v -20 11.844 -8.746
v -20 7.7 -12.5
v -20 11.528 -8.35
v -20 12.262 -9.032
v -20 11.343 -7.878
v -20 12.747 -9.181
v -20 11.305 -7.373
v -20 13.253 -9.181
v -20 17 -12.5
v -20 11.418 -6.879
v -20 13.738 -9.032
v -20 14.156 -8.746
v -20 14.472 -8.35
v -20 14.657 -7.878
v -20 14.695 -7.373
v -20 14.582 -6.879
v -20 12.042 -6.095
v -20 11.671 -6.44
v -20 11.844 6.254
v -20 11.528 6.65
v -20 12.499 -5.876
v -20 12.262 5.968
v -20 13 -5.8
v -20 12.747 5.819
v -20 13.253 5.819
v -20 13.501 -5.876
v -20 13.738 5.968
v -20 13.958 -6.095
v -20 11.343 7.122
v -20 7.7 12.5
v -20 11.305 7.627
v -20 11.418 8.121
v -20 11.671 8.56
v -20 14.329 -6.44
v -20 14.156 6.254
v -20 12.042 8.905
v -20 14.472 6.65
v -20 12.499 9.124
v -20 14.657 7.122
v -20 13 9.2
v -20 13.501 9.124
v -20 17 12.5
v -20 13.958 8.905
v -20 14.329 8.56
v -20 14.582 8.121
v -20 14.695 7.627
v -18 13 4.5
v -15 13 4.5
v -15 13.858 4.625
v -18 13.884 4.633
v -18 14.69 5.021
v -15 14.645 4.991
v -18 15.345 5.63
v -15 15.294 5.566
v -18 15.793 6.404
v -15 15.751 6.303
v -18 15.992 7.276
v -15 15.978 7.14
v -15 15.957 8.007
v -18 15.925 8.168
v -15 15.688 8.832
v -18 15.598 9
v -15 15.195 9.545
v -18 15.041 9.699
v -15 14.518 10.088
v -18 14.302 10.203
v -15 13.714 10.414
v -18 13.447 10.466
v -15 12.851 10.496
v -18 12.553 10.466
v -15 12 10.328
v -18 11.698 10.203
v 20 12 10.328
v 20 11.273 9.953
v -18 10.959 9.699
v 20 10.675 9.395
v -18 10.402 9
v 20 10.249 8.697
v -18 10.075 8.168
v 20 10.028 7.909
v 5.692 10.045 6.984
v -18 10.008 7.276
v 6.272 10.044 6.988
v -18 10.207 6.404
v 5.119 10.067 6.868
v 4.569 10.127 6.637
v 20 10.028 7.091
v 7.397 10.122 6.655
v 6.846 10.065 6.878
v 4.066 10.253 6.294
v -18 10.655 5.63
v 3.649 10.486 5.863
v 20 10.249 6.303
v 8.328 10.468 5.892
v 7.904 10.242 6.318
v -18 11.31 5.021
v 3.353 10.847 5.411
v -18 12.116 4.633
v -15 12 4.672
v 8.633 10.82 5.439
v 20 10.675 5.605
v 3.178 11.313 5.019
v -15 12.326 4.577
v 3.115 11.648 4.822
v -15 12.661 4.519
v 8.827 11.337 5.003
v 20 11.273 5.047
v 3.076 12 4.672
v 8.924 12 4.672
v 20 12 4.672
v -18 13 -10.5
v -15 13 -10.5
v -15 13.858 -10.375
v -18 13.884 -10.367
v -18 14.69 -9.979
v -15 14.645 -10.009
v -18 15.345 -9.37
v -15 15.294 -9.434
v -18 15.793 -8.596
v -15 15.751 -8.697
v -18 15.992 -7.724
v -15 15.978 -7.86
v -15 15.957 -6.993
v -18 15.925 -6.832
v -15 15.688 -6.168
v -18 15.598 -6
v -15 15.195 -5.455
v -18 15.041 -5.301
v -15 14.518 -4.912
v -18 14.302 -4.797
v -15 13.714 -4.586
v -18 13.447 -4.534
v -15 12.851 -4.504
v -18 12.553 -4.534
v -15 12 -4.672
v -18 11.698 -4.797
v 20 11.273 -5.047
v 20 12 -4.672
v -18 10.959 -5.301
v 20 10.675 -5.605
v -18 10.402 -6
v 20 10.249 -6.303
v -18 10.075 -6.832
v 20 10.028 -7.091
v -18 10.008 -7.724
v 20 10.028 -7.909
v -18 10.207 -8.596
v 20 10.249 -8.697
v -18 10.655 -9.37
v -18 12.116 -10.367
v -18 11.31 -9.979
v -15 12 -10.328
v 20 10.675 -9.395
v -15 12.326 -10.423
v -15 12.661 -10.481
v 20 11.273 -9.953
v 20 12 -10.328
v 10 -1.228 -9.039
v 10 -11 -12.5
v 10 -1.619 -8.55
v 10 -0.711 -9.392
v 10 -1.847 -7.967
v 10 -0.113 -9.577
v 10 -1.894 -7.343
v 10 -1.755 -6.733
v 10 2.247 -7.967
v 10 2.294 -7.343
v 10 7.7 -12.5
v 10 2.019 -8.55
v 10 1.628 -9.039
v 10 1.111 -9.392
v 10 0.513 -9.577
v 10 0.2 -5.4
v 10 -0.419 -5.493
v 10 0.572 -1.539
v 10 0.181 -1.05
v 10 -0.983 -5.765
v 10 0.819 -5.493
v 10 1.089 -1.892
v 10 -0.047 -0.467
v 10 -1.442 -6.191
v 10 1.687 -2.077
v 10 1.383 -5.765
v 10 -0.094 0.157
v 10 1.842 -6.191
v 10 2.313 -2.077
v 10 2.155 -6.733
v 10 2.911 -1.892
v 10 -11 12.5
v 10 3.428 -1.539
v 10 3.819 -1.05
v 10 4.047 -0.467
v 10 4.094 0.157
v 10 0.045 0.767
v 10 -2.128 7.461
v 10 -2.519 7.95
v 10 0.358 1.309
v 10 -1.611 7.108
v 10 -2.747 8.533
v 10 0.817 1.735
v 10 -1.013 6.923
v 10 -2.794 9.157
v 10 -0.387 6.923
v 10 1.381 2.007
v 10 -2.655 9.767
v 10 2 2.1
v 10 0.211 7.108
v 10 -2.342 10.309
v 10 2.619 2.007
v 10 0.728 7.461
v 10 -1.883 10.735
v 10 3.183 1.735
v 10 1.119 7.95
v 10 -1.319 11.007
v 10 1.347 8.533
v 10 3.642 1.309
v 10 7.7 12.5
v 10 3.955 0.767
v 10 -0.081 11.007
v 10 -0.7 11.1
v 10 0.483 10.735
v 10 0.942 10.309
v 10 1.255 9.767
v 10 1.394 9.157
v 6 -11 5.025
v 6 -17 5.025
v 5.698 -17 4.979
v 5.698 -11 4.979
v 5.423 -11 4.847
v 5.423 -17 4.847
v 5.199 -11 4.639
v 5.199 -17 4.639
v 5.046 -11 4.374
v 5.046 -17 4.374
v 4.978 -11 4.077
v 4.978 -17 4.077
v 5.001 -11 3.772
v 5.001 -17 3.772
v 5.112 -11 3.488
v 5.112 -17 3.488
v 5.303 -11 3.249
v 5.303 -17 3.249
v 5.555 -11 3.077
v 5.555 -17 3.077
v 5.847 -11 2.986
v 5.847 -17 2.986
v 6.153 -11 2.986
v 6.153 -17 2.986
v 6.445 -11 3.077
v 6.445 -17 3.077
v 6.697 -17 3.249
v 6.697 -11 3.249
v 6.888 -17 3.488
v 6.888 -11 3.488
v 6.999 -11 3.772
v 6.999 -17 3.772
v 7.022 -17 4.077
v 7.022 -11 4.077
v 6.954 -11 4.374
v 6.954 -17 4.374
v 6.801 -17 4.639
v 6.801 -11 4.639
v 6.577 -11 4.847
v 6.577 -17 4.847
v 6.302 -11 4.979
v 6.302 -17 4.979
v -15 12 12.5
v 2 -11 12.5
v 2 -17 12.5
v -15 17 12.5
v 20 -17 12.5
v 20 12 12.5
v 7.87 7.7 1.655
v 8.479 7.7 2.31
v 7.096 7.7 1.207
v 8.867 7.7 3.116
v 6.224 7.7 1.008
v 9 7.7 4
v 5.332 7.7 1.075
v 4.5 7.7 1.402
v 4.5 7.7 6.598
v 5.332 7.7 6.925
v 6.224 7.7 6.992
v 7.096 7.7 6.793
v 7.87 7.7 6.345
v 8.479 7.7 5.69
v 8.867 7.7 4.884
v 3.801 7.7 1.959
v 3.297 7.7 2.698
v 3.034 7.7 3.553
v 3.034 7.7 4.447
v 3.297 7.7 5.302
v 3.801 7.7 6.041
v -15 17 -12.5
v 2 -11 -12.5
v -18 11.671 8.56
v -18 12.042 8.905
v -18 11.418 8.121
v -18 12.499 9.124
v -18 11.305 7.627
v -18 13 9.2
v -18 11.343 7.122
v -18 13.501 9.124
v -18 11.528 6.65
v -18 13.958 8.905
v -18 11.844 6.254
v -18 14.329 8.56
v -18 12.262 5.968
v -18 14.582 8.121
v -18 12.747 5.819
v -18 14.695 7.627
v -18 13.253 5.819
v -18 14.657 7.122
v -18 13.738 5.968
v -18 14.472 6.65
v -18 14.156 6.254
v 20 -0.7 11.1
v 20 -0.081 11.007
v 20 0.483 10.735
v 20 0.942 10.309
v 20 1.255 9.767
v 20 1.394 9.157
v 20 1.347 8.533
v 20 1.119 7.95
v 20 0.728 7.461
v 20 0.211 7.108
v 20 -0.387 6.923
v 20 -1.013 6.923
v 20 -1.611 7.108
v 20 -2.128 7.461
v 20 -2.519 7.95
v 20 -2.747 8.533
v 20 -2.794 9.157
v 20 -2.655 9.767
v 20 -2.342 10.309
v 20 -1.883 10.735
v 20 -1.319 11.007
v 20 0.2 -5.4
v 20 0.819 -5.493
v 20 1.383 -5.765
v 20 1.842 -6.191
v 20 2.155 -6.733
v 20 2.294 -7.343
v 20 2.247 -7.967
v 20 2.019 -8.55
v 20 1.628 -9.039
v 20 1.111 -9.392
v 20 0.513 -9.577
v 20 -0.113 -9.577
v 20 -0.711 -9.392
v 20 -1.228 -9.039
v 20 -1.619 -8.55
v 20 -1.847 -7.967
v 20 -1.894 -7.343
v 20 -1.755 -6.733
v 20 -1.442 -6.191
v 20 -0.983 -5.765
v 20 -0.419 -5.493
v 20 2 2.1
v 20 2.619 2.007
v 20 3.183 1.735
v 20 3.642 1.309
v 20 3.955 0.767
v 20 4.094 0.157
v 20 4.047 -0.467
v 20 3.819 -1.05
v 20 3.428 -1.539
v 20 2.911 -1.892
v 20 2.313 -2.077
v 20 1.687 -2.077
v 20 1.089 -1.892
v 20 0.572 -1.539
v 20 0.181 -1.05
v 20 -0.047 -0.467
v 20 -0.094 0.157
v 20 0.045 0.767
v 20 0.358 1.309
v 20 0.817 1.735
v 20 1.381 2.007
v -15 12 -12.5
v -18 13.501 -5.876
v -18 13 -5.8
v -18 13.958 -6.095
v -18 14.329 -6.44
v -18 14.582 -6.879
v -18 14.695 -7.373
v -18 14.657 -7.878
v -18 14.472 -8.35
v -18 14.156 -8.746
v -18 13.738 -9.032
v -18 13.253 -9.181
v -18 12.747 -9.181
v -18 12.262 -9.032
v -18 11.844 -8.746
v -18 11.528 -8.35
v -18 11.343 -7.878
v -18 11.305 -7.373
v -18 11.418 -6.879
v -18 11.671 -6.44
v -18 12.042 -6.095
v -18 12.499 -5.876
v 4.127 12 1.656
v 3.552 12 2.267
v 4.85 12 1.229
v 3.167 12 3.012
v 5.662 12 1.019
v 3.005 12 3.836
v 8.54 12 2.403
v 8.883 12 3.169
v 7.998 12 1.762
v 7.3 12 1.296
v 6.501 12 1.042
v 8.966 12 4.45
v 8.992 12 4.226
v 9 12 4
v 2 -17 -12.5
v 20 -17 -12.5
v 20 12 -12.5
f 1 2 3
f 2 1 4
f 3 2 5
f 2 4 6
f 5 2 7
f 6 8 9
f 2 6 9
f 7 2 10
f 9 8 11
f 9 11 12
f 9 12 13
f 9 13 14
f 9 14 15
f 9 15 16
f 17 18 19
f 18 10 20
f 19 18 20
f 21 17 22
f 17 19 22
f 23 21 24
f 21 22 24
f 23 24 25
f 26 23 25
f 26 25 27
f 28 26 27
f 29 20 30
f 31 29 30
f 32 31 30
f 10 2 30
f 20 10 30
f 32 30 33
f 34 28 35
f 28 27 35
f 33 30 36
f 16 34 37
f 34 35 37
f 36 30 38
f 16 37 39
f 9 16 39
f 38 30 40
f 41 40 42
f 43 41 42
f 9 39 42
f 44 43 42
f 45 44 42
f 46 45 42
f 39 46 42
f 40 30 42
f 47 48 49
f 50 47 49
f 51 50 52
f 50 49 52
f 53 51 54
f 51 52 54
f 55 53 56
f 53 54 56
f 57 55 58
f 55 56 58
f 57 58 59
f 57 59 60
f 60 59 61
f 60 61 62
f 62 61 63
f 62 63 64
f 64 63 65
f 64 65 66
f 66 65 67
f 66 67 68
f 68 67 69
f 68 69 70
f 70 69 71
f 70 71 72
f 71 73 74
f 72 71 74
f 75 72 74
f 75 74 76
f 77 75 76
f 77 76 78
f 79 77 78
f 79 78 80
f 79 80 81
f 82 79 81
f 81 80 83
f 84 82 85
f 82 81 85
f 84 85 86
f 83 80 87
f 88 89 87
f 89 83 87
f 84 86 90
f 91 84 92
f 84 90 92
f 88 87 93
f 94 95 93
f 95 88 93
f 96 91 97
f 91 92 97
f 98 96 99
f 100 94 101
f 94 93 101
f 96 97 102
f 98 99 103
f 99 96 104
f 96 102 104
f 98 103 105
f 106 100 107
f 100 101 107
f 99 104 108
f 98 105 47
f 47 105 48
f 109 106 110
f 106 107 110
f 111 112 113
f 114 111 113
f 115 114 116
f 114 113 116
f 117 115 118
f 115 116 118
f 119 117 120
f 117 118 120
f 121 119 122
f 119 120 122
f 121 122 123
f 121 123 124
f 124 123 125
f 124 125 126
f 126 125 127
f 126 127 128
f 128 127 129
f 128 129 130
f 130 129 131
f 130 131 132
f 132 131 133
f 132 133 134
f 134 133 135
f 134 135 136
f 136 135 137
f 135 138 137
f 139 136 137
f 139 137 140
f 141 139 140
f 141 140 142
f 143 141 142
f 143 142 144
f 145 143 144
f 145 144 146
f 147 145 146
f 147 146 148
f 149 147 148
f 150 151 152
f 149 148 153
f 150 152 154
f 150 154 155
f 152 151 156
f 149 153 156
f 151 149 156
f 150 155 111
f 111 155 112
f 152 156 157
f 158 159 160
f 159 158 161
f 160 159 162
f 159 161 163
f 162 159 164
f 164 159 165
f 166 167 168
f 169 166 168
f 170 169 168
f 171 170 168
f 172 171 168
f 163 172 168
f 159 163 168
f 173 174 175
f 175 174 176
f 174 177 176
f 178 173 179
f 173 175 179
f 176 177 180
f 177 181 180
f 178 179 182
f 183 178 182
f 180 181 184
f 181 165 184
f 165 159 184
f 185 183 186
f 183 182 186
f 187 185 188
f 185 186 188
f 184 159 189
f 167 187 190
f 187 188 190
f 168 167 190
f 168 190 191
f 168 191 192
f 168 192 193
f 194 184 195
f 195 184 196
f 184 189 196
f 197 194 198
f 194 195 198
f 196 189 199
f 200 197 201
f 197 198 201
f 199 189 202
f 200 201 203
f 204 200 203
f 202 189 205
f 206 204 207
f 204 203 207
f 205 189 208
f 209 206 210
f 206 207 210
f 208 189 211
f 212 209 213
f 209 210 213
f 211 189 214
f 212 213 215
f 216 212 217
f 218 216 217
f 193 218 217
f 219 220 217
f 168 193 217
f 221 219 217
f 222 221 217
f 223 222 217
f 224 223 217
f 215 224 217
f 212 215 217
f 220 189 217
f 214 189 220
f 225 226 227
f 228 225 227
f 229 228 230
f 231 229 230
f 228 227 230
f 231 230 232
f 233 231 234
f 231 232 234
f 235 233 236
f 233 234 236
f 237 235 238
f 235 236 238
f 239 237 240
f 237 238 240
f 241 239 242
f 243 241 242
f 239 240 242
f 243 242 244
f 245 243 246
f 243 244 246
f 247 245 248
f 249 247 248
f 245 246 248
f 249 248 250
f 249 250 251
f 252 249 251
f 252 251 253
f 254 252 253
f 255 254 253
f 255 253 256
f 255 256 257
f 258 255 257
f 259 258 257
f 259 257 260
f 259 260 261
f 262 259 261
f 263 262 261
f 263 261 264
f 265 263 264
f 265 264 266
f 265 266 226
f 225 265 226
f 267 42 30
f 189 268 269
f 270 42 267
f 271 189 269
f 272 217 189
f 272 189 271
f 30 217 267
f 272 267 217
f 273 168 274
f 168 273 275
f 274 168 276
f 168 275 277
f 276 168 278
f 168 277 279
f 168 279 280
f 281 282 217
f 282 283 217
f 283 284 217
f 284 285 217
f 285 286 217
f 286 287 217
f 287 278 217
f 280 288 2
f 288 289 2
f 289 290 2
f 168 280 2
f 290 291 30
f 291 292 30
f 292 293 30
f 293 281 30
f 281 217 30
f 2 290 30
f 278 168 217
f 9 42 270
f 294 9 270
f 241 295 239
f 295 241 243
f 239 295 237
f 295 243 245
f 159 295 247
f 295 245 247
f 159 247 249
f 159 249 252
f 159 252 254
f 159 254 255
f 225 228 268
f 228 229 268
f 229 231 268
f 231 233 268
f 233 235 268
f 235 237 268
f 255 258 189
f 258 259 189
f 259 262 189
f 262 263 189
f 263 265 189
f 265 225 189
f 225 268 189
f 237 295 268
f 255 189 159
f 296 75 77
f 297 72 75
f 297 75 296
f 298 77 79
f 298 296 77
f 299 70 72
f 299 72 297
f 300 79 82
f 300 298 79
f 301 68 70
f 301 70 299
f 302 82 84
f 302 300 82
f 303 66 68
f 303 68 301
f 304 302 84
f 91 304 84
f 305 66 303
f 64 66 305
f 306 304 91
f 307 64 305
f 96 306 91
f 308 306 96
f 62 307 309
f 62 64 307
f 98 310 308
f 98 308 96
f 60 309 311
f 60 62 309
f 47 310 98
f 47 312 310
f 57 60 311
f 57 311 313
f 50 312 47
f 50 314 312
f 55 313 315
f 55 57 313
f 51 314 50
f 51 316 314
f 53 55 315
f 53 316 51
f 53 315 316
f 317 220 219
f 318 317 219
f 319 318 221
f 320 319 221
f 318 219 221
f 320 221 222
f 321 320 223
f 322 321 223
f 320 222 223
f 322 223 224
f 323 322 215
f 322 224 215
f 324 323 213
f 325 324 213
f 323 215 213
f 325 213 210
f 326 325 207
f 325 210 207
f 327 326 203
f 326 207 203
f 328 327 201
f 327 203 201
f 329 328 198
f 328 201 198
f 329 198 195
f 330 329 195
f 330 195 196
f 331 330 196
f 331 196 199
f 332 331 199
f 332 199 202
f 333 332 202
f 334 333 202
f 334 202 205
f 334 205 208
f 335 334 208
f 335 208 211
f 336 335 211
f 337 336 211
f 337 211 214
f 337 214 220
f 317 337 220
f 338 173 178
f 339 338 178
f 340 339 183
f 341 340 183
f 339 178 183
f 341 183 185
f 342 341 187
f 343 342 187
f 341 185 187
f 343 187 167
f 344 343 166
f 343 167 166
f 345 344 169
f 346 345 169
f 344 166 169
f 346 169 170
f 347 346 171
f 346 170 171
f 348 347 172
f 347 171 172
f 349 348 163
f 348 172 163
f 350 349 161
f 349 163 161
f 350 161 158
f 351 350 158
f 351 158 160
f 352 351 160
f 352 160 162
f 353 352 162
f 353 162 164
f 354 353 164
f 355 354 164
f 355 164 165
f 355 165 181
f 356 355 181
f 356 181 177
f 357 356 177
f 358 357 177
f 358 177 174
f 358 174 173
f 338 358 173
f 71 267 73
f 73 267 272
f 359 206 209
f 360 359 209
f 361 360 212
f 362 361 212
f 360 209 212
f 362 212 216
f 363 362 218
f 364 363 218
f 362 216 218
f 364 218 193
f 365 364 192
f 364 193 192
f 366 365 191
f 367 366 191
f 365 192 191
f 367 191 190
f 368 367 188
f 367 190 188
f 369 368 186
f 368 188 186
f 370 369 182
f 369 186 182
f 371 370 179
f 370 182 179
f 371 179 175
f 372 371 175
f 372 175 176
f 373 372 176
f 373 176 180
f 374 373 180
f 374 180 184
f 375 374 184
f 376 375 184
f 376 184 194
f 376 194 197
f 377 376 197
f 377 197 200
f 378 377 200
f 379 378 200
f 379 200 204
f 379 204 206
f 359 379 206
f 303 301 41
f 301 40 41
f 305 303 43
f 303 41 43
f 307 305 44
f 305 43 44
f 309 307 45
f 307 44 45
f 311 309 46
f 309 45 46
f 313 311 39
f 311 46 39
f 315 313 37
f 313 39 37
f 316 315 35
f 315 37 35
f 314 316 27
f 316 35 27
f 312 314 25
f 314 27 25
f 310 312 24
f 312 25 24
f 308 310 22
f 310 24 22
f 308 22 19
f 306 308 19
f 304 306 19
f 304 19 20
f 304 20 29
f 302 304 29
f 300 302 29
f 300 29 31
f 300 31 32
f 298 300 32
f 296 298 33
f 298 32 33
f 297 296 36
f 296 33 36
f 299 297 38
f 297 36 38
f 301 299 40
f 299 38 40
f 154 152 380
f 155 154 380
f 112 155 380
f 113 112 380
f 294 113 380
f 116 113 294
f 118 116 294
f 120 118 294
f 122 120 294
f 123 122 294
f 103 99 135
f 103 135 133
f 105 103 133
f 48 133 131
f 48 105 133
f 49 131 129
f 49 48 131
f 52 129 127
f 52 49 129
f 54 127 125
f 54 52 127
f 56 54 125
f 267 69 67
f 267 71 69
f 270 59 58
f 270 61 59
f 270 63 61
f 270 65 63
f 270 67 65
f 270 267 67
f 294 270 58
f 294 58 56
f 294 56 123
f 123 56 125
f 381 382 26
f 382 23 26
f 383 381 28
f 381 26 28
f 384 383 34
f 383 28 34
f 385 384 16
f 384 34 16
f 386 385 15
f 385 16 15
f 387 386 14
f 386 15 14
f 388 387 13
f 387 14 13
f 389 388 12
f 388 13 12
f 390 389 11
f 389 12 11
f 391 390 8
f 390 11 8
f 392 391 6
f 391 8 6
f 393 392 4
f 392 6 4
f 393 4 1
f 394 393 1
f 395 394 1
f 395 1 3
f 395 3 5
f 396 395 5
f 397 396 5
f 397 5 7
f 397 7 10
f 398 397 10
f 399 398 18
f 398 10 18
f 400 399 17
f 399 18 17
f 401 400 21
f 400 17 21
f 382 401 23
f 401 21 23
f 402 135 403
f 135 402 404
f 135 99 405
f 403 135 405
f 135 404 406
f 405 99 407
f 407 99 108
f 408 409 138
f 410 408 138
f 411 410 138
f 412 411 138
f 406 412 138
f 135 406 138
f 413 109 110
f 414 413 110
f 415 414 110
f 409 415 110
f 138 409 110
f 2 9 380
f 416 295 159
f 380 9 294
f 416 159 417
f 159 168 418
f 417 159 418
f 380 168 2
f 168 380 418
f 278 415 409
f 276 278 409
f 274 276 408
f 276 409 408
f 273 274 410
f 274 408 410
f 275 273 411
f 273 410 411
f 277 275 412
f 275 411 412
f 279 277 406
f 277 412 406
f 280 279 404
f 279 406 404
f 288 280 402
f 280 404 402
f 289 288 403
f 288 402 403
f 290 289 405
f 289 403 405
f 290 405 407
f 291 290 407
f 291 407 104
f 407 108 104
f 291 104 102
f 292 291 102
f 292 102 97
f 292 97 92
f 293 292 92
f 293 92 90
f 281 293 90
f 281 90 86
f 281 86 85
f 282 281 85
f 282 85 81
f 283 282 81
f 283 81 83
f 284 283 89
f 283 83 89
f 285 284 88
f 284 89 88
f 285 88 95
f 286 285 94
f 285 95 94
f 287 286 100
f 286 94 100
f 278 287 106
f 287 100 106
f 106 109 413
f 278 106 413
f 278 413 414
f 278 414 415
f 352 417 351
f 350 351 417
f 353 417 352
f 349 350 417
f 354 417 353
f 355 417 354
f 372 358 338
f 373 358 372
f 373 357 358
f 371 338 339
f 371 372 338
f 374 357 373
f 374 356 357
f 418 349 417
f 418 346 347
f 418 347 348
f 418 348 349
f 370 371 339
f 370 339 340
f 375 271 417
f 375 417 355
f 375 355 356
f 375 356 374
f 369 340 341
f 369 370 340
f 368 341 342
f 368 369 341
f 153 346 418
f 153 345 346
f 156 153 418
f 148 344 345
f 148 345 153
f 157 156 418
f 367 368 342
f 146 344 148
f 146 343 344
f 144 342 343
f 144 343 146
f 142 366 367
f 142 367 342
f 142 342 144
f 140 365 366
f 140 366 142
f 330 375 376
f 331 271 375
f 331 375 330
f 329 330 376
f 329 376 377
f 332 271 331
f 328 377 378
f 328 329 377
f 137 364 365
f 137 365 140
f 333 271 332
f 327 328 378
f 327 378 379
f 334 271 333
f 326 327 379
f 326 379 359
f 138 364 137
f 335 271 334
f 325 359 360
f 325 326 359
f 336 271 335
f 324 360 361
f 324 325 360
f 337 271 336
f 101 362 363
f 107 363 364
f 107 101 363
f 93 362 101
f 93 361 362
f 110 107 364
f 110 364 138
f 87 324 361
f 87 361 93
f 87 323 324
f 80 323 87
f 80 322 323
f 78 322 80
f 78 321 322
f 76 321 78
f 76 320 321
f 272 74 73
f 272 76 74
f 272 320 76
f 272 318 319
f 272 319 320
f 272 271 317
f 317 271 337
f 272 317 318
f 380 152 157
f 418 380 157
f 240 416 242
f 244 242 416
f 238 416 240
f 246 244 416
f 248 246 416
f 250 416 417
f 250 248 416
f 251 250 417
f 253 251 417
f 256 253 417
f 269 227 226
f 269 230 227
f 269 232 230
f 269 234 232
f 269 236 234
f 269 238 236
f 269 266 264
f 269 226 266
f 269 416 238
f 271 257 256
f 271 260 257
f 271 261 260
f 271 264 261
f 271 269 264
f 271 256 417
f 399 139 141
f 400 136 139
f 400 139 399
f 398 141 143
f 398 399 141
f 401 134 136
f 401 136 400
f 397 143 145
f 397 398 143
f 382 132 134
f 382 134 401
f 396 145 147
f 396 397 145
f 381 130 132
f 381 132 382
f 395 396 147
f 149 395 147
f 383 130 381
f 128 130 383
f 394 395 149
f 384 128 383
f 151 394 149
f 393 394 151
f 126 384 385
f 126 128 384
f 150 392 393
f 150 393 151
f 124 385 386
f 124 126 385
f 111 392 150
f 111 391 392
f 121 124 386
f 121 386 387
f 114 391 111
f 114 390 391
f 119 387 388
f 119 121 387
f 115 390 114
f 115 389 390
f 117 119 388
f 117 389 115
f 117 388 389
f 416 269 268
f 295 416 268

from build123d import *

# Parameters (mm, degrees)
SKETCH_1_W                = 40
SKETCH_1_H                = 34
EXTRUDE_1_DEPTH           = 12.5
HOLE_WIZARD_1_D           = 3.4
HOLE_WIZARD_1_CBORE_D     = 6
HOLE_WIZARD_1_CBORE_DEPTH = 38
SKETCH_2_W                = 35
SKETCH_2_H                = 5
CUT_EXTRUDE_1_DEPTH       = 37.249137921
HOLE_WIZARD_M2_5_1_D      = 2.05
HOLE_WIZARD_M2_5_1_DEPTH  = 6
HOLE_WIZARD_M5_1_D        = 4.2
HOLE_WIZARD_1_2_REACH     = 39.38
HOLE_WIZARD_1_2_BORE_R    = 3
HOLE_WIZARD_2_D           = 4.2


with BuildPart() as part:
    # 草图1 → 凸台-拉伸1 (new, symmetric)
    with BuildSketch(Plane.XY):
        Rectangle(SKETCH_1_W, SKETCH_1_H)
    extrude(amount=EXTRUDE_1_DEPTH, both=True)

    # Hole Wizard 1 (through all)
    with Locations(Plane(origin=(20, -11.097573199, 8.576816528), x_dir=(0, 0, -1), z_dir=(1, 0, 0))):
        with Locations((1.076816528, 24.097573199), (16.076816528, 24.097573199)):
            CounterBoreHole(HOLE_WIZARD_1_D / 2, HOLE_WIZARD_1_CBORE_D / 2, HOLE_WIZARD_1_CBORE_DEPTH)

    # 草图2 → 切除-拉伸1 (cut, through all)
    with BuildSketch(Plane.XY.offset(12.5)):
        with Locations((2.5, 14.5)):
            Rectangle(SKETCH_2_W, SKETCH_2_H)
        Polygon((-20, -17), (2, -17), (2, -11), (10, -11), (10, 7.7), (-20, 7.7), align=None)
    extrude(amount=-CUT_EXTRUDE_1_DEPTH, mode=Mode.SUBTRACT)

    # M2.5 螺纹孔1
    with Locations(Plane(origin=(23.183007196, -11, -17.133988824), x_dir=(0, 0, -1), z_dir=(0, 1, 0))):
        with Locations((-21.133988824, 17.183007196)):
            Hole(HOLE_WIZARD_M2_5_1_D / 2, depth=HOLE_WIZARD_M2_5_1_DEPTH)

    # M5 螺纹孔1 (through all)
    with Locations(Plane(origin=(20, 0, 0), x_dir=(0, 0, -1), z_dir=(1, 0, 0))):
        with Locations((0, 2), (-9, -0.7)):
            Hole(HOLE_WIZARD_M5_1_D / 2)

    # Hole Wizard 1 2 bore → Hole Wizard 1 2 (cut, up to next)
    with BuildSketch(Plane(origin=(0, 12, 0), x_dir=(1, 0, 0), z_dir=(0, 1, 0)), mode=Mode.PRIVATE) as hole_wizard_1_2_sk1:
        with Locations((6, -4)):
            Circle(HOLE_WIZARD_1_2_BORE_R)
    hole_wizard_1_2_tool1 = extrude(hole_wizard_1_2_sk1.sketch, amount=-HOLE_WIZARD_1_2_REACH, mode=Mode.PRIVATE) & part.part
    add(hole_wizard_1_2_tool1.solids().sort_by_distance((6, 12, 4))[0], mode=Mode.SUBTRACT)

    # 孔2 (through all)
    with Locations(Plane(origin=(20, 0, 0), x_dir=(0, 0, -1), z_dir=(1, 0, 0))):
        with Locations((7.5, 0.2)):
            Hole(HOLE_WIZARD_2_D / 2)


solid = part.part
